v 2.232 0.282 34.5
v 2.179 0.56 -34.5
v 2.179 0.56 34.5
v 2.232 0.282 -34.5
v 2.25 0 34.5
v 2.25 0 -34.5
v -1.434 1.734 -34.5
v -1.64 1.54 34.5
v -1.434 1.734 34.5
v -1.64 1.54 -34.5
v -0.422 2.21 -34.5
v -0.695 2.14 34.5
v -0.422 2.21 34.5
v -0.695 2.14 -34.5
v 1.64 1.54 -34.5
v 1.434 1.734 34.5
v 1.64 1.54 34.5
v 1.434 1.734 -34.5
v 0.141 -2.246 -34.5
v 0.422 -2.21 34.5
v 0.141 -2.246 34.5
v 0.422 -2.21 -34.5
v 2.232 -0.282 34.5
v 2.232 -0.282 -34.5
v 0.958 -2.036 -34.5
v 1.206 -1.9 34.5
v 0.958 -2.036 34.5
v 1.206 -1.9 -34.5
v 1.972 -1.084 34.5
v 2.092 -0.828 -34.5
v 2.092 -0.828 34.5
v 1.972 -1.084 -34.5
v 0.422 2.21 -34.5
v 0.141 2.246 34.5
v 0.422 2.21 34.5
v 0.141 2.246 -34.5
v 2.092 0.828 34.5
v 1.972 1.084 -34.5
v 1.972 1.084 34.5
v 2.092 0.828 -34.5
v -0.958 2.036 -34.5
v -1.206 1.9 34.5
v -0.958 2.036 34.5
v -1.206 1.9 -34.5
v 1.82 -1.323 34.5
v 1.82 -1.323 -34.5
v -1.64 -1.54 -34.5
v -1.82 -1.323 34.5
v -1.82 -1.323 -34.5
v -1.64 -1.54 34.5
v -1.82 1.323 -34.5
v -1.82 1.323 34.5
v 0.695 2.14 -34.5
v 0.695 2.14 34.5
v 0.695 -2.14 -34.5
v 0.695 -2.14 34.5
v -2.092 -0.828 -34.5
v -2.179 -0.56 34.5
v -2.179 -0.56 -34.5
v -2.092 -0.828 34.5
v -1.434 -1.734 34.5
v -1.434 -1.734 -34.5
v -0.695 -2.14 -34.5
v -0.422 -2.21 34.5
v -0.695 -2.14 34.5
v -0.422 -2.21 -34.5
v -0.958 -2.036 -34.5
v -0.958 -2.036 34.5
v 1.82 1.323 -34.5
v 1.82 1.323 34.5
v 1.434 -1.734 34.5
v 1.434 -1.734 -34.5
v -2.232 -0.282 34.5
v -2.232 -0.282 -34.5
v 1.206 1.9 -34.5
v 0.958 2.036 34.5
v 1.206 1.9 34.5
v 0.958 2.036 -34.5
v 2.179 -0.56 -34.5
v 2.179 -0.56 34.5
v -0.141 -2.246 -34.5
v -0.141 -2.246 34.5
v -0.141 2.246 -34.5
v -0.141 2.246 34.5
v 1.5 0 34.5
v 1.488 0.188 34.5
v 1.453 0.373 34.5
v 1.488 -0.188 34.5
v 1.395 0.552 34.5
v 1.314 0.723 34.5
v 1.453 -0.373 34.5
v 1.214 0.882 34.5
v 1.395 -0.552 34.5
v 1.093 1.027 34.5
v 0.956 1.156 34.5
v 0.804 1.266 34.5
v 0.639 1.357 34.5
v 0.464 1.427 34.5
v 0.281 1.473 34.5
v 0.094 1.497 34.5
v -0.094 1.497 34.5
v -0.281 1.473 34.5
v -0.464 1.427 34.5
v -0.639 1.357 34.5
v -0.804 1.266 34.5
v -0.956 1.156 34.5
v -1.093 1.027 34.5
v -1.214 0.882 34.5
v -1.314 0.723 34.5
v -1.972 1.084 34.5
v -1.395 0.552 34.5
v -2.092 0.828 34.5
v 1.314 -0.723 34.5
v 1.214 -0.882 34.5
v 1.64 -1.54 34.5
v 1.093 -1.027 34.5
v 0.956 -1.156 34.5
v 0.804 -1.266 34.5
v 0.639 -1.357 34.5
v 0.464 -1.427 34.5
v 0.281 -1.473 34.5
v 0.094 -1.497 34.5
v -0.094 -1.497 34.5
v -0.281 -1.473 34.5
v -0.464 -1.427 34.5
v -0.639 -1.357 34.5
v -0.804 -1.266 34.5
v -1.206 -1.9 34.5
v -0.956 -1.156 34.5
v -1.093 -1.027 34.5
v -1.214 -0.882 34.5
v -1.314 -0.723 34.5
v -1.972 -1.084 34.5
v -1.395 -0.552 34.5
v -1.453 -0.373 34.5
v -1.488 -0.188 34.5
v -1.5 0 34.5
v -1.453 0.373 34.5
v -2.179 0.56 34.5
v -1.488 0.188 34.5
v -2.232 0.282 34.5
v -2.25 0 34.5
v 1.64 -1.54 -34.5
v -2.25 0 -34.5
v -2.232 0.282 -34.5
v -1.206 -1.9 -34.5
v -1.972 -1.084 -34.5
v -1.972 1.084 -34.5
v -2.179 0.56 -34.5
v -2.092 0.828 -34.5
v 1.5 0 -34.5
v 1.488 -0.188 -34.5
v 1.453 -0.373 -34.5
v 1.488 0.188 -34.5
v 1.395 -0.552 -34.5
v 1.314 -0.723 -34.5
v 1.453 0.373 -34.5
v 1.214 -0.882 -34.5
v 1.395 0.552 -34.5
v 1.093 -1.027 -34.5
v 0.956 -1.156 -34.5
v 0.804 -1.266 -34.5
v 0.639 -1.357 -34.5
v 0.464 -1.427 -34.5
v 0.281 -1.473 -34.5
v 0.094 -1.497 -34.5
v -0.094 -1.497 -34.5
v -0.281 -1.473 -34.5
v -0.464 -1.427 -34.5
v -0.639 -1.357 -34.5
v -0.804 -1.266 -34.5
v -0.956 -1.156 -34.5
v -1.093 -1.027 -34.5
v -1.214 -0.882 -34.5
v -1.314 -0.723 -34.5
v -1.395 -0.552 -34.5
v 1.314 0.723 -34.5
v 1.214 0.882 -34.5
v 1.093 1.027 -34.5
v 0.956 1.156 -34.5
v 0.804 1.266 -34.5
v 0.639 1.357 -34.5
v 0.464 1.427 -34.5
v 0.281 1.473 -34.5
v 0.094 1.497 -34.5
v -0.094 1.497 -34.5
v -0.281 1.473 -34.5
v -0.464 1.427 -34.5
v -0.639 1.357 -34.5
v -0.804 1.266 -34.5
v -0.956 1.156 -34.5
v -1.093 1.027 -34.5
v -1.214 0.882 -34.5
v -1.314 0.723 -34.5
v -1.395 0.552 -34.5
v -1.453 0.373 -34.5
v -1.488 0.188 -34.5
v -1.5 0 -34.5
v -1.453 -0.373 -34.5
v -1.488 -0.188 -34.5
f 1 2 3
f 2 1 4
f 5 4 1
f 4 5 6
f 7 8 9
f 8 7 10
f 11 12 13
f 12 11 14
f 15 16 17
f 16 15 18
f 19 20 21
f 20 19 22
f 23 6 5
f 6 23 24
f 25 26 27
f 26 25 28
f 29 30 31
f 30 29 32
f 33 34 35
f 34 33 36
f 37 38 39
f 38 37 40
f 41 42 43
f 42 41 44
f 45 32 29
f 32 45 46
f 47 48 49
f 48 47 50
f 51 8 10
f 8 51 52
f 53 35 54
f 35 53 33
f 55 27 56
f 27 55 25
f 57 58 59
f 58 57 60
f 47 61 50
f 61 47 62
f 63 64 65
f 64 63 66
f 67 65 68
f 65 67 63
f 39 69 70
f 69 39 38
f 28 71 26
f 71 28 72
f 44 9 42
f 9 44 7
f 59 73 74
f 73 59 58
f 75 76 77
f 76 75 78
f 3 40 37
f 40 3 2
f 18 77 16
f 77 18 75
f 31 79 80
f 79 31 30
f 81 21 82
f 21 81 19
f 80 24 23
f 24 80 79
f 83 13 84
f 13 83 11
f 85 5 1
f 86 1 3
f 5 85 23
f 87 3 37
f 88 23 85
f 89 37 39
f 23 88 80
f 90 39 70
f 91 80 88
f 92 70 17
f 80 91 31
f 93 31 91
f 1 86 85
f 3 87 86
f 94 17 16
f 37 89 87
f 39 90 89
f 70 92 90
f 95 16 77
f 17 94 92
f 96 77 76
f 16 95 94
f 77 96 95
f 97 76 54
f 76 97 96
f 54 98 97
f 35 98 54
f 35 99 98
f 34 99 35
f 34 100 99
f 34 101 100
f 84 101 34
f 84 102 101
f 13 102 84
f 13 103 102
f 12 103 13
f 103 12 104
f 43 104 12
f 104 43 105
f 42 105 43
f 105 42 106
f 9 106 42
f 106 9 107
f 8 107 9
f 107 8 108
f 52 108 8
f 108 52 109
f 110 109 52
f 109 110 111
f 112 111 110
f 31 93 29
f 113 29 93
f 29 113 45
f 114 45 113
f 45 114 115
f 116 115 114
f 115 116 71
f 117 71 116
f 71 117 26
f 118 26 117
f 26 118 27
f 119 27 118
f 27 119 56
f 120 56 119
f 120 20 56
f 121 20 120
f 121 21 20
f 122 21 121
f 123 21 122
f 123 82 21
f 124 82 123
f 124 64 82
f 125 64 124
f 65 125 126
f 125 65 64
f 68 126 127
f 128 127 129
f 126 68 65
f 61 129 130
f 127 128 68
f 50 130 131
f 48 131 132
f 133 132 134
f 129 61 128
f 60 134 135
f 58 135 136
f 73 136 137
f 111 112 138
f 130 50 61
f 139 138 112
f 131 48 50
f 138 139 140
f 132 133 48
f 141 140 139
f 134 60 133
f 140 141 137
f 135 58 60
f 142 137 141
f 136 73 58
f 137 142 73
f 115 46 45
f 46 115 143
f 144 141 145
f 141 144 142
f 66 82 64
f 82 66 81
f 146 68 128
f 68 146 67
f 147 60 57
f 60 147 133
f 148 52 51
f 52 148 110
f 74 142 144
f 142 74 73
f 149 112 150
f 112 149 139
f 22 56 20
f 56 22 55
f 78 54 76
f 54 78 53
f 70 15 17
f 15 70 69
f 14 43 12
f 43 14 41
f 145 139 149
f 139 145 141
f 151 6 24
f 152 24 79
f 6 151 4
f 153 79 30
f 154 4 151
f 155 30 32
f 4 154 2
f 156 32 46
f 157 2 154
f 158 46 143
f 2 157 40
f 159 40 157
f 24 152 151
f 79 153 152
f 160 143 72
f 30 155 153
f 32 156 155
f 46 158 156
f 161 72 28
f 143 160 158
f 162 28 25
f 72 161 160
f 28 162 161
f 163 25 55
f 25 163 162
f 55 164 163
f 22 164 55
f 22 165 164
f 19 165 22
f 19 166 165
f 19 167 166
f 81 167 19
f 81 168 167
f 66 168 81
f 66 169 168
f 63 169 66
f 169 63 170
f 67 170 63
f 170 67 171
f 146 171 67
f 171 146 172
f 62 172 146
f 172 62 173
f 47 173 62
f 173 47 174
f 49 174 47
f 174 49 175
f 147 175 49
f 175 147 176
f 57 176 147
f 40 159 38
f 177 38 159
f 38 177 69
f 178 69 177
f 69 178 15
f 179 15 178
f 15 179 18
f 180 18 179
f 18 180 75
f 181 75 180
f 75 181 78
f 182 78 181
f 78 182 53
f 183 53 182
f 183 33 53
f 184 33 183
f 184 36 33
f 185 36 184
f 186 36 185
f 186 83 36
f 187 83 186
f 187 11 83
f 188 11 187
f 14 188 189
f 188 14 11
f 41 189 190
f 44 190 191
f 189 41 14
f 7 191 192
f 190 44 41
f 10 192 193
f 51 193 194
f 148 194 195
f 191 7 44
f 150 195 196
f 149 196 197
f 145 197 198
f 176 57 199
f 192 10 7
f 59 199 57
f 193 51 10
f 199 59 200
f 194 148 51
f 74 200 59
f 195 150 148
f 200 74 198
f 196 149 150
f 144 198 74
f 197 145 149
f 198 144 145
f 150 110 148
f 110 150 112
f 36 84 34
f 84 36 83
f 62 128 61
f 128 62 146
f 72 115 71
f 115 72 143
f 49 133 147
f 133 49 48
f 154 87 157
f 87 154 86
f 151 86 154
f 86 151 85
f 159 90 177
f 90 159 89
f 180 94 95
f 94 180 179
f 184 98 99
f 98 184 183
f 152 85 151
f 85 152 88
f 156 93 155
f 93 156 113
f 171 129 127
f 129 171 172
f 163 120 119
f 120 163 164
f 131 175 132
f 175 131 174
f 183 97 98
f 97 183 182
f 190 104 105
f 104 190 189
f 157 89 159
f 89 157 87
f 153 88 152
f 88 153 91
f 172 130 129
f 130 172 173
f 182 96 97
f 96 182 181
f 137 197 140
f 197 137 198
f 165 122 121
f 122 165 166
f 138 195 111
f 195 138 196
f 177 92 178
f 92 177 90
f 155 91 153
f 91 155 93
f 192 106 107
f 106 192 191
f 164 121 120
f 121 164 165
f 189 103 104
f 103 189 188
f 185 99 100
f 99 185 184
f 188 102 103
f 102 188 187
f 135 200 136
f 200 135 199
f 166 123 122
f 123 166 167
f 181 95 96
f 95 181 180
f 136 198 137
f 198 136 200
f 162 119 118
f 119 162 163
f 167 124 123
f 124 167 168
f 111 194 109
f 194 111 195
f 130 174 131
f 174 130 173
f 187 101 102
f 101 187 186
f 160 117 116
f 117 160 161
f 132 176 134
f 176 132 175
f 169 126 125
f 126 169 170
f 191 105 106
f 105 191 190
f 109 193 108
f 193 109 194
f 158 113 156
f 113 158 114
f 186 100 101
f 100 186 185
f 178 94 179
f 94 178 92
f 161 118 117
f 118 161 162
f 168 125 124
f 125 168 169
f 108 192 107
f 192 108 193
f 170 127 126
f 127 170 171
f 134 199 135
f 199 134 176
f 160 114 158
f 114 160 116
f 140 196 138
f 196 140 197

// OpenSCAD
$fn = 50;


difference() {
	union() {
		translate(v = [0, 0, -34.5000000000]) {
			cylinder(h = 69, r = 2.2500000000);
		}
	}
	union() {
		translate(v = [0, 0, -100.0000000000]) {
			cylinder(h = 200, r = 1.5000000000);
		}
	}
}
